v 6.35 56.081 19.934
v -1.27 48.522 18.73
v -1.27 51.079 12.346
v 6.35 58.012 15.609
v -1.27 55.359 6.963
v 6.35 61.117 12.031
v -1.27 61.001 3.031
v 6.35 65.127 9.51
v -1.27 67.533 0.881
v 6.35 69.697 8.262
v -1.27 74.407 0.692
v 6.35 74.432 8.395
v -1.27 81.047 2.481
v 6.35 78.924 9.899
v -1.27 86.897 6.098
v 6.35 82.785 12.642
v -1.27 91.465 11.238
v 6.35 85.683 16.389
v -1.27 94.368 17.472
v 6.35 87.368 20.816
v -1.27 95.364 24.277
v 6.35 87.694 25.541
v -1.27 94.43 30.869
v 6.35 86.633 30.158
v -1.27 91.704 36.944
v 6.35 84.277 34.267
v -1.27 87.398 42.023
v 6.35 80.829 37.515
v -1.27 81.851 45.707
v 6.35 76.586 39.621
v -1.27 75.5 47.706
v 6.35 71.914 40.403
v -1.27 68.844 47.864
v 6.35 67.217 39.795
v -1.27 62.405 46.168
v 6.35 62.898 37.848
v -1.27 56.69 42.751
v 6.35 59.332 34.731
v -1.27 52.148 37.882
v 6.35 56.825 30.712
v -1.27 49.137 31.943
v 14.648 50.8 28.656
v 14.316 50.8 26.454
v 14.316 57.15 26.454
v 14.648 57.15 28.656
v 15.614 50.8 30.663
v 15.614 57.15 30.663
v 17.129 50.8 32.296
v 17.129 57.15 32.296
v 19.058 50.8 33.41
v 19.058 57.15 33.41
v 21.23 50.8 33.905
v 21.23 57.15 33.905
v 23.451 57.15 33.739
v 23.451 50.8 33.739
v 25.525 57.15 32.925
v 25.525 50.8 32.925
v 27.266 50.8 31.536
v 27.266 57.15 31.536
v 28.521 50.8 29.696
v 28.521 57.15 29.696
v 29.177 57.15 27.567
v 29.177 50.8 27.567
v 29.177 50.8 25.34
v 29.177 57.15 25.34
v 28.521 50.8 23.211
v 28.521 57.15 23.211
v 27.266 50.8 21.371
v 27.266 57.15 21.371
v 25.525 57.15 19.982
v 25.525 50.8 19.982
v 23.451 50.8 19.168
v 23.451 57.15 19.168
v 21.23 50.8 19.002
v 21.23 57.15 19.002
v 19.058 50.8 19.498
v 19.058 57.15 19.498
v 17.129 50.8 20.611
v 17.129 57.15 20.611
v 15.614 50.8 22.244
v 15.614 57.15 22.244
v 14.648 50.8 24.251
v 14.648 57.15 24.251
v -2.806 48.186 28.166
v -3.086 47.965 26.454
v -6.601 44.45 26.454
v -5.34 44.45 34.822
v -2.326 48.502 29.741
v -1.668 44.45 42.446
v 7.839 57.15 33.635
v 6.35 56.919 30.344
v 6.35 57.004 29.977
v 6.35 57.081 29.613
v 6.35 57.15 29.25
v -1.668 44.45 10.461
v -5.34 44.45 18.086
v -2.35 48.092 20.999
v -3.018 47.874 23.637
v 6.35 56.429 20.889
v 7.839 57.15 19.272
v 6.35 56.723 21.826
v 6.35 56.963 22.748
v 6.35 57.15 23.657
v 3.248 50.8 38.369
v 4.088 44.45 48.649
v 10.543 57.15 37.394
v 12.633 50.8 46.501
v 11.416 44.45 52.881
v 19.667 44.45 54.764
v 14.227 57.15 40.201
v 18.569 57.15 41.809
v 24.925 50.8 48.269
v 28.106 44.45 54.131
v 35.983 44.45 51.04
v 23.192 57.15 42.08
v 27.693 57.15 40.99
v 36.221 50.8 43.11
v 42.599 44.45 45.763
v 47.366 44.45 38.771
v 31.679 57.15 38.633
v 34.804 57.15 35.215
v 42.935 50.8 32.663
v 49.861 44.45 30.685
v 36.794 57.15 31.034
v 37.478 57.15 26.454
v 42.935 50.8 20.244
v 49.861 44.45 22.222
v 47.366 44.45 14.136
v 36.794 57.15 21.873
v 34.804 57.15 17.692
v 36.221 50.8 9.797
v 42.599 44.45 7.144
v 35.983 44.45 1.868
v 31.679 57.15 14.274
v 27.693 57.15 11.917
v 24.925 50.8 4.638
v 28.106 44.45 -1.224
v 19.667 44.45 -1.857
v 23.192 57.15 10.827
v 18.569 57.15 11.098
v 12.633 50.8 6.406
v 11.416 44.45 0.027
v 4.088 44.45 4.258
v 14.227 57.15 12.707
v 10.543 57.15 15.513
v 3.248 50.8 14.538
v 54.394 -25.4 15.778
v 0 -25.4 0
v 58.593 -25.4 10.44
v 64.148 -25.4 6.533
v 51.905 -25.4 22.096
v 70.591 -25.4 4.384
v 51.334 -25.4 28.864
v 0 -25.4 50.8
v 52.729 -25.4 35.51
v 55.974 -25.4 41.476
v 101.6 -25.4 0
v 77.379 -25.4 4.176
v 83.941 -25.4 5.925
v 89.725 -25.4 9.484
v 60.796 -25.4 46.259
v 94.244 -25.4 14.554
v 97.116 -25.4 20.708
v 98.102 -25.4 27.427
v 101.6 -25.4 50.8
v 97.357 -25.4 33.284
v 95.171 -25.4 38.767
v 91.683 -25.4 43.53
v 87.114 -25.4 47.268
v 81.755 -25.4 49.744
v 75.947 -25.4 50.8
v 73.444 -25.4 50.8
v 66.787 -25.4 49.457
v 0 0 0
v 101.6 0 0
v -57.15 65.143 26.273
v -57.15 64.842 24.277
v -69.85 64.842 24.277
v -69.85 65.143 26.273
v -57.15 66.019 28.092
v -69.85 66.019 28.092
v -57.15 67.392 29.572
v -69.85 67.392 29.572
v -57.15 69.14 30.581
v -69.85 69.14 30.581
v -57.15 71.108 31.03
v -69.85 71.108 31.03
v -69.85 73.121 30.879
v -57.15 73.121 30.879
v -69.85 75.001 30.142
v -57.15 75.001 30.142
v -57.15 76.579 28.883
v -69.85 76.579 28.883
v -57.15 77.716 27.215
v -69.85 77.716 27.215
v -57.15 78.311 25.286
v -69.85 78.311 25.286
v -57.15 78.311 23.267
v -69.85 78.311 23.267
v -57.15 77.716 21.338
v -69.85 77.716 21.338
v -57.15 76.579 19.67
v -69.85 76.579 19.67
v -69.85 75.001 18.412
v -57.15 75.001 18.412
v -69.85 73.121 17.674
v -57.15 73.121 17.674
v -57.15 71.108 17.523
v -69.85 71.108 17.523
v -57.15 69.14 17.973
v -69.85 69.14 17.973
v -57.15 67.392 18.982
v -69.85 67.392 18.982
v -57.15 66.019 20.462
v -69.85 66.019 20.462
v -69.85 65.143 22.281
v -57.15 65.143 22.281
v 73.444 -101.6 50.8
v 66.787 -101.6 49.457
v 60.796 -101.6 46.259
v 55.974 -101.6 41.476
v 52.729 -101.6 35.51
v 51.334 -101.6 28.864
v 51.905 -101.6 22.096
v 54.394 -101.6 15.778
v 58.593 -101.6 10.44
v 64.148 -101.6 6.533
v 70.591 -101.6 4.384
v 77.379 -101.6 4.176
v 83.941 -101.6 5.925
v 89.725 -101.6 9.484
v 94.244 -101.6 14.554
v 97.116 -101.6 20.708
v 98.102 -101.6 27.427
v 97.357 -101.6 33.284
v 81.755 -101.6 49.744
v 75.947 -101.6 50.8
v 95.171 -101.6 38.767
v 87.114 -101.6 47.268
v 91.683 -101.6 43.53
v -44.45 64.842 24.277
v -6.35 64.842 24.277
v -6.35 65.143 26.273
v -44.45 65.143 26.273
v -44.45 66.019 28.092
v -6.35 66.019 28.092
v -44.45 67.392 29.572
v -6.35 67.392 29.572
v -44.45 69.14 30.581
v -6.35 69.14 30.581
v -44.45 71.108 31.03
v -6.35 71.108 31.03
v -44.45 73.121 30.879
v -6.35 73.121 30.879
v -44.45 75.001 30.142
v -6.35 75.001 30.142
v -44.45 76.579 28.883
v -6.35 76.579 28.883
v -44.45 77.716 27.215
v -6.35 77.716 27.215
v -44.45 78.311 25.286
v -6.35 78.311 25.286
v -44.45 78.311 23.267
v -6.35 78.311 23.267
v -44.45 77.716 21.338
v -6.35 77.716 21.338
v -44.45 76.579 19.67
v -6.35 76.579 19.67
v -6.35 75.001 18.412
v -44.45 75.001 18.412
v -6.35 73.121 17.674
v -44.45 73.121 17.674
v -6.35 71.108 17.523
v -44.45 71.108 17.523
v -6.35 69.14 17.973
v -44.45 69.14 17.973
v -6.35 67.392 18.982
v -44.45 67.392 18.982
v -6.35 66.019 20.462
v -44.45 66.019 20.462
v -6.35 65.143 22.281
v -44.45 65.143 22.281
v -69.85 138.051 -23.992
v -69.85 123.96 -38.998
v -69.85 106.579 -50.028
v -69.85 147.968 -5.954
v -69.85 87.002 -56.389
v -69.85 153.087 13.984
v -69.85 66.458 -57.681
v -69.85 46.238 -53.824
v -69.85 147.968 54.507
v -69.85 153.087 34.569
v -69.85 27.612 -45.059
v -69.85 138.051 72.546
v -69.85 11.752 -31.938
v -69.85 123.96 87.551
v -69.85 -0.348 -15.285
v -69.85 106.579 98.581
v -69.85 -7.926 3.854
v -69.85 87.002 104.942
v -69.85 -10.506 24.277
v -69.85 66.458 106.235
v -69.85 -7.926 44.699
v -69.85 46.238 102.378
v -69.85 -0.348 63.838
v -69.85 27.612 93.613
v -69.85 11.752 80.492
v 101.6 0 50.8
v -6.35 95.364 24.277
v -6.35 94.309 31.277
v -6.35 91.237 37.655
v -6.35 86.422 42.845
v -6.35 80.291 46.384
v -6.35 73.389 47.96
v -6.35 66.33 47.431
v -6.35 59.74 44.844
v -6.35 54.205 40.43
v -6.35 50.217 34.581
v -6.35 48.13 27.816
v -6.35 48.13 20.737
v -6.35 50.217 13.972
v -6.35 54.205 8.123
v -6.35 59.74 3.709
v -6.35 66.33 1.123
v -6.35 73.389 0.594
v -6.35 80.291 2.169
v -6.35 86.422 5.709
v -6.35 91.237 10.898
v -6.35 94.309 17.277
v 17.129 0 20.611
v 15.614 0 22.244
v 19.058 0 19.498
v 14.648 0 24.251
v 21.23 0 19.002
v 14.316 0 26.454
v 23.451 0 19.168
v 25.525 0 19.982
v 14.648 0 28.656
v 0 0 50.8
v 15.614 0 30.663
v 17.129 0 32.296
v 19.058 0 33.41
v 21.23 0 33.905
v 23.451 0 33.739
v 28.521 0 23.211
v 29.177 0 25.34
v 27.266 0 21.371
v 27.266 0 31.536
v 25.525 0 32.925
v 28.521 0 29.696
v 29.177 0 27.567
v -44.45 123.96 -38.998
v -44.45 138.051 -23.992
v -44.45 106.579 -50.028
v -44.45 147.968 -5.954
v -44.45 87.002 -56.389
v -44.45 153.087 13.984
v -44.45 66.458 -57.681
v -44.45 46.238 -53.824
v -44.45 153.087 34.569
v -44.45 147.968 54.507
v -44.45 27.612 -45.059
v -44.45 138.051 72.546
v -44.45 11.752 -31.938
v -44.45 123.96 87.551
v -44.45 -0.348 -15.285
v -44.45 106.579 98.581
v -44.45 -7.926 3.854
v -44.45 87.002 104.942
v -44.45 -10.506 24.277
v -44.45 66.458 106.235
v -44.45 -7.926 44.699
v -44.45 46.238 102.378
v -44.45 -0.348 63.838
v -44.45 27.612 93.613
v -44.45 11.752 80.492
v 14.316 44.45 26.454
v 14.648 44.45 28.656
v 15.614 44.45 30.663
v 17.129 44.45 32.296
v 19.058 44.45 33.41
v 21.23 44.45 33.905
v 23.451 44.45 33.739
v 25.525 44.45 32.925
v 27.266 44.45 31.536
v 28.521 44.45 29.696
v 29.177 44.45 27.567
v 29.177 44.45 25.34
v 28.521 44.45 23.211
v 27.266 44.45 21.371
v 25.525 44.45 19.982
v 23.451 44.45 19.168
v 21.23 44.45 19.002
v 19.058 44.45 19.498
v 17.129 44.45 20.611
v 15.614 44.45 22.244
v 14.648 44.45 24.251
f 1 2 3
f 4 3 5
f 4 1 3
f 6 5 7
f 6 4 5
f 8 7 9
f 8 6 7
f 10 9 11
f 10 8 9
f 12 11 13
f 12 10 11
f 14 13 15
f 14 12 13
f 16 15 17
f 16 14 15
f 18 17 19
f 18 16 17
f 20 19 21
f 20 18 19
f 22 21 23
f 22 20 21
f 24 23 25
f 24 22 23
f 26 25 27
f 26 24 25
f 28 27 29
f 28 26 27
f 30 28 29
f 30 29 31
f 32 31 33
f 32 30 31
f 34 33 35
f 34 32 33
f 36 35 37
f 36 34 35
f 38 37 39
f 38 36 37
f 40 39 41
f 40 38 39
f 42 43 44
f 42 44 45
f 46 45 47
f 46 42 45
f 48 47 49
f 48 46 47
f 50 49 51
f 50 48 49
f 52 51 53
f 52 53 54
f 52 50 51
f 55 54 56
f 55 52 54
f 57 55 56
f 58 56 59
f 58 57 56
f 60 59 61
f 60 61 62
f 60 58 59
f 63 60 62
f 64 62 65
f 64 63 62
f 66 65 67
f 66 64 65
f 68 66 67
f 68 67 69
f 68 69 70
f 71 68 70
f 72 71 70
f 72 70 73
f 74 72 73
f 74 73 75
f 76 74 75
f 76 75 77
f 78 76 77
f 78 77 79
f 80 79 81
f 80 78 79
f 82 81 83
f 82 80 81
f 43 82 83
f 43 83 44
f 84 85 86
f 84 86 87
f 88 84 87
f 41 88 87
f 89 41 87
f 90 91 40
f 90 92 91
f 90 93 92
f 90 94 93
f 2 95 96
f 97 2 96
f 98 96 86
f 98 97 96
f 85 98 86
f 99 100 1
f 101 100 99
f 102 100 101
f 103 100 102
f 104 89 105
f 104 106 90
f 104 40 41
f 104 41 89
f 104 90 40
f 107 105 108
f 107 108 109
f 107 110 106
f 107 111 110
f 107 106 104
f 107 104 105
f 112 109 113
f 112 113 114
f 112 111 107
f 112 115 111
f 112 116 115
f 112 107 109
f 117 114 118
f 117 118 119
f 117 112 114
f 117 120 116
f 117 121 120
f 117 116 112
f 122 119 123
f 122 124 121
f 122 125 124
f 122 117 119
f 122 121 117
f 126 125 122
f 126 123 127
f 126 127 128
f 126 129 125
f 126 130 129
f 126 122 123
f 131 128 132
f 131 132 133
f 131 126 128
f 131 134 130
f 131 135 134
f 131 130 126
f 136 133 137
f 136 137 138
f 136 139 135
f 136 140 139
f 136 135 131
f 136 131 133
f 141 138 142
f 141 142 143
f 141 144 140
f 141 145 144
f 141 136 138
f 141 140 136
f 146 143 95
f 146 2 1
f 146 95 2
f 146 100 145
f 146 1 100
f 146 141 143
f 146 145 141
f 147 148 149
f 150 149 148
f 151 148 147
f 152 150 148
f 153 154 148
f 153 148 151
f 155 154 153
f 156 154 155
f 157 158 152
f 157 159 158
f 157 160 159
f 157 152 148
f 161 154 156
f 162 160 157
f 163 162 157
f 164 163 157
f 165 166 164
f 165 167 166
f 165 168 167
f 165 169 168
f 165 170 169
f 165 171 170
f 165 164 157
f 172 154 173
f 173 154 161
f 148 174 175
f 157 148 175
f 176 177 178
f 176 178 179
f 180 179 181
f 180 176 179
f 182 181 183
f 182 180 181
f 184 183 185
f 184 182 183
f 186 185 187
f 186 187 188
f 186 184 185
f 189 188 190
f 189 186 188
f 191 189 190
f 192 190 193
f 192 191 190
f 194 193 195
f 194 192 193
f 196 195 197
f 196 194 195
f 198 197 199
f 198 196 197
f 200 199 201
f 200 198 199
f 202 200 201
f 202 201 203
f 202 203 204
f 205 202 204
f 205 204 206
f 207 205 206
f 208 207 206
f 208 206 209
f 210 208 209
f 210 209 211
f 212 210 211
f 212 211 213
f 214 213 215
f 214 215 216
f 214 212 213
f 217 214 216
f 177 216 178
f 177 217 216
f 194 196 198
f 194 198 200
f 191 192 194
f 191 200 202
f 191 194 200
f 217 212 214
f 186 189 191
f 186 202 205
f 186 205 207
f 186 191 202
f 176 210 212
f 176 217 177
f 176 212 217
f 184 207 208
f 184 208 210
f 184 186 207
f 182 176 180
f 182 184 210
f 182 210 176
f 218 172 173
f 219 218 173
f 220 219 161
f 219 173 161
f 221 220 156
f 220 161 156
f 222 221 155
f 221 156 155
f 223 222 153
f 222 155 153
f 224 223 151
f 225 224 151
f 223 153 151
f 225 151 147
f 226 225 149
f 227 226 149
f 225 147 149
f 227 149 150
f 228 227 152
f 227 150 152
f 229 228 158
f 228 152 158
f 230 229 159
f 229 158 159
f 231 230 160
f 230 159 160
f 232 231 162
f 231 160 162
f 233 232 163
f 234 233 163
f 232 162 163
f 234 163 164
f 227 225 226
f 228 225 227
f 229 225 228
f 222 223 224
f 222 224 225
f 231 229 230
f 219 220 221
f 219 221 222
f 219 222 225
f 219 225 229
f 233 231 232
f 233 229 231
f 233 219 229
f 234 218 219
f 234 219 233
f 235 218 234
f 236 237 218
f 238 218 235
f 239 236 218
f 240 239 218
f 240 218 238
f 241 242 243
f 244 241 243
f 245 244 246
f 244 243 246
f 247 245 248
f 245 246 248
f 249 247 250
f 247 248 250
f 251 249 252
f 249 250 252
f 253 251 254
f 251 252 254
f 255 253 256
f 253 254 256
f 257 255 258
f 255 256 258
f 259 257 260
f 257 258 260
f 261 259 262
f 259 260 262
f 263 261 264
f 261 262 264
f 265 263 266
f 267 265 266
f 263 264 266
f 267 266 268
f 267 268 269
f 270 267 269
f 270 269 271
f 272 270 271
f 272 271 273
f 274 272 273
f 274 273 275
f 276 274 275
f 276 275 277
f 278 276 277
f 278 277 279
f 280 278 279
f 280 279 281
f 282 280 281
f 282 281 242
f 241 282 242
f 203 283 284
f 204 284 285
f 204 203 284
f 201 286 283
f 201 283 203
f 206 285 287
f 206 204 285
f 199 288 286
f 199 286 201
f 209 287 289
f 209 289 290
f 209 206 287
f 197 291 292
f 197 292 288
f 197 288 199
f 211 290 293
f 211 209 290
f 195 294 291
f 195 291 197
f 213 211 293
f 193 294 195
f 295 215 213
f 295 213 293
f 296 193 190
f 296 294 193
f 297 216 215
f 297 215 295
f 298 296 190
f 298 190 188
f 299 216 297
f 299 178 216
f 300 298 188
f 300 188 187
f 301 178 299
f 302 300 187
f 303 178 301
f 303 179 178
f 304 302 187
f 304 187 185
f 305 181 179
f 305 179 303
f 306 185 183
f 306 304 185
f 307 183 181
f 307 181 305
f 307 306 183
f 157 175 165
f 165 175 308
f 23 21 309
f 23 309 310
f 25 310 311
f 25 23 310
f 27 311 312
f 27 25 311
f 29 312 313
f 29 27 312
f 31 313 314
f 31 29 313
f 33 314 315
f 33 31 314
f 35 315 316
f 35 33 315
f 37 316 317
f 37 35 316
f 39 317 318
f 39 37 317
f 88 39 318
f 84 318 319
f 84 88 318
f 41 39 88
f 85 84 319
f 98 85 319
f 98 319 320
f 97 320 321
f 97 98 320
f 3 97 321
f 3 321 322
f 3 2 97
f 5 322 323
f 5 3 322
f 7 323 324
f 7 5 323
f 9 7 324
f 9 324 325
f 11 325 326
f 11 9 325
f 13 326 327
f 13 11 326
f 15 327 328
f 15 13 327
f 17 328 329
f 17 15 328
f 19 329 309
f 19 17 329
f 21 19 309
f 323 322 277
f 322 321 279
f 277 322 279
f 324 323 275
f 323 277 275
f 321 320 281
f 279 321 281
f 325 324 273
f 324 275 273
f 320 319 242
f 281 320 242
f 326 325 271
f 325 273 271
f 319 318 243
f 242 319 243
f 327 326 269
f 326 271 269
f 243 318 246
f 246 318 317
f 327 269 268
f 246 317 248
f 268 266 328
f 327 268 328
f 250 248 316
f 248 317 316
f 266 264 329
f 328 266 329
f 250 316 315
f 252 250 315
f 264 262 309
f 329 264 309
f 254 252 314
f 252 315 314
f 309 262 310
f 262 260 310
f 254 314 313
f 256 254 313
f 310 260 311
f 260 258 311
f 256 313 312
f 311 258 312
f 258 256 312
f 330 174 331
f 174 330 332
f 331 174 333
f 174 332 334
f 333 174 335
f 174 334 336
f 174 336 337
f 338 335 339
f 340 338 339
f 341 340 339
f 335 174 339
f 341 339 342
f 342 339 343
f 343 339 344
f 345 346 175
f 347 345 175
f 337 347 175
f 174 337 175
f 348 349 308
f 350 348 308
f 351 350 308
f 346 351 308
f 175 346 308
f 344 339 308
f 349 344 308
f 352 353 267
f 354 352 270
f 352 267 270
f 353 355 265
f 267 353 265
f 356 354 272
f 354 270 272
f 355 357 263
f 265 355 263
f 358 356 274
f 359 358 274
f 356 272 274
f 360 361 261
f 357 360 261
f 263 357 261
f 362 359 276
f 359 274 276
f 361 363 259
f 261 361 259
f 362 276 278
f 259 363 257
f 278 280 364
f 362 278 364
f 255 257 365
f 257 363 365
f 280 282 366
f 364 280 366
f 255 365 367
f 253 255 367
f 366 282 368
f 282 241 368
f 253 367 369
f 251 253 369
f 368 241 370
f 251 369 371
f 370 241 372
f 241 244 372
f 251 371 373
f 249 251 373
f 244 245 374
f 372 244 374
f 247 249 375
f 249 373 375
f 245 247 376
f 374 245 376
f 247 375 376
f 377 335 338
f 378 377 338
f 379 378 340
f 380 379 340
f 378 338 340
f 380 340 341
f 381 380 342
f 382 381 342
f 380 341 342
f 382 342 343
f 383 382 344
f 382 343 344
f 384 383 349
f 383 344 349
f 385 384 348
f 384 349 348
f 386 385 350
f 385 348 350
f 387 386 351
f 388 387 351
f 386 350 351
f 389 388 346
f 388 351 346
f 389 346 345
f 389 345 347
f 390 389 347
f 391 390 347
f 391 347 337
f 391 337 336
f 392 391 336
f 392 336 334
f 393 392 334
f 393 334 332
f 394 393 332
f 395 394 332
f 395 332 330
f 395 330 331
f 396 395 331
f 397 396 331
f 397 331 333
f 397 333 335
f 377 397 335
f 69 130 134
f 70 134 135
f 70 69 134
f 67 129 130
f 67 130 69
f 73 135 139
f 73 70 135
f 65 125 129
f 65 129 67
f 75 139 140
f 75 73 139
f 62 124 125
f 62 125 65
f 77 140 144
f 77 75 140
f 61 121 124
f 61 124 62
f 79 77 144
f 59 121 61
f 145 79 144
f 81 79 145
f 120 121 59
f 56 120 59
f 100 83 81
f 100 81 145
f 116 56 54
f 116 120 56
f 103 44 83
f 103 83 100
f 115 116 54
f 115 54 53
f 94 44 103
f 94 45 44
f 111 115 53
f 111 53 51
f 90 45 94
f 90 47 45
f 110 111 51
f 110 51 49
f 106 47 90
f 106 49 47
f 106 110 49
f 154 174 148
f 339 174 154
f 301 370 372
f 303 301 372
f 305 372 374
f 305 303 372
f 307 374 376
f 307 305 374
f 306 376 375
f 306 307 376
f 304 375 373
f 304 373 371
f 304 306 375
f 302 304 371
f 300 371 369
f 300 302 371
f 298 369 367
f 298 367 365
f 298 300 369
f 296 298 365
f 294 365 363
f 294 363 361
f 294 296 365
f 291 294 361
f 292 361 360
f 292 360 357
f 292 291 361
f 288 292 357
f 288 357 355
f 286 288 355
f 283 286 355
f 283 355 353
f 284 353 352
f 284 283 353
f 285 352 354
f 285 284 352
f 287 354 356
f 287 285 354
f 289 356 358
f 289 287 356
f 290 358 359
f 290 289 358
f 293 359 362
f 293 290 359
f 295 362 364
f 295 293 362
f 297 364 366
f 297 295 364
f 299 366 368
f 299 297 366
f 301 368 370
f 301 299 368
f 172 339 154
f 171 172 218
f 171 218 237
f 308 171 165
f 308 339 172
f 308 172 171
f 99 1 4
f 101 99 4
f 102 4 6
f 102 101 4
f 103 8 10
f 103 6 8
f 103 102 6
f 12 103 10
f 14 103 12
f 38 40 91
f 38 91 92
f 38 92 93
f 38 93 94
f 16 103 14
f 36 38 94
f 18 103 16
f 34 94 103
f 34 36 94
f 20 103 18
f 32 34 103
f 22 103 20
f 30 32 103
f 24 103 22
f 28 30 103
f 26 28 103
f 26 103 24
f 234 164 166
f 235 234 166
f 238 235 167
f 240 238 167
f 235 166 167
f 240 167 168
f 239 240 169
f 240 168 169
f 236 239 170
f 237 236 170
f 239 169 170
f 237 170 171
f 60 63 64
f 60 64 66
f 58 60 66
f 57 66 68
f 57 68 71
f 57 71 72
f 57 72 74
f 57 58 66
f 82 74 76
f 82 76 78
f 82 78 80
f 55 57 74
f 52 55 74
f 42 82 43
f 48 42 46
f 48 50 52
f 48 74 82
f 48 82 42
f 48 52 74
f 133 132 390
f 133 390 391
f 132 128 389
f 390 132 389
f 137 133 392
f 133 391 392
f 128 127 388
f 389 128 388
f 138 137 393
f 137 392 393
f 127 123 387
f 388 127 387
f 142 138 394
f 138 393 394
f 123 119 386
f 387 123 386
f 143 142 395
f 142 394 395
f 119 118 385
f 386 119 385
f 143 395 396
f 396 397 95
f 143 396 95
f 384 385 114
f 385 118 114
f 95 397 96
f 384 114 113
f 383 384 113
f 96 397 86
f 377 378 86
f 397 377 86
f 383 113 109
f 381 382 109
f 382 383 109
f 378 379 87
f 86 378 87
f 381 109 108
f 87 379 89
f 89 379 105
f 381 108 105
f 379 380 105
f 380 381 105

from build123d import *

# Parameters (mm, degrees)
F0_W      = 101.6
F0_H      = 50.8
F1_DEPTH  = 25.4
F3_DEPTH  = 76.2
F4_R      = 7.4724872864
F5_DEPTH  = 50.8
F6_R      = 28.3895179235
F6_R_2    = 7.4724872864
F7_DEPTH  = 6.35
F8_SIZE   = 12.69999
F9_R      = 23.7493356576
F10_DEPTH = 6.35
F11_SIZE  = 7.62
F12_R     = 6.7723102527
F13_DEPTH = 50.8
F14_R     = 82.1200007596
F14_R_2   = 6.7723102527
F15_DEPTH = 12.7


# Not quite as in the source:
# - a fillet or chamfer is up to 0.001 mm smaller than in the source, because OpenCascade refuses the exact size


with BuildPart() as f1:
    # F0 (on Front) → F1 (new body)
    with BuildSketch(Plane.XZ):
        with Locations((50.8, 25.4)):
            Rectangle(F0_W, F0_H)
    extrude(amount=F1_DEPTH)

    # F2 (on face) → F3 (join)
    with BuildSketch(Plane.XZ.offset(25.4)):
        with BuildLine():
            ThreePointArc((73.4443714217, 50.8), (58.5934004133, 10.4401432835), (98.1016742507, 27.4273641407))
            ThreePointArc((98.1016742507, 27.4273641407), (91.6827931143, 43.5295359845), (75.9467730924, 50.8))
            Line((75.9467730924, 50.8), (73.4443714217, 50.8))
        make_face()
    extrude(amount=F3_DEPTH)

    # F4 (on face) → F5 (join)
    with BuildSketch(Plane(origin=(0, 0, 0), x_dir=(-1, 0, 0), z_dir=(0, 1, 0))):
        with Locations((-21.7883531004, 26.4536123723)):
            Circle(F4_R)
    extrude(amount=F5_DEPTH)

    # F6 (on face) → F7 (join, symmetric)
    with BuildSketch(Plane(origin=(0, 50.8, 0), x_dir=(-1, 0, 0), z_dir=(0, 1, 0))):
        with Locations((-21.7883531004, 26.4536123723)):
            Circle(F6_R)
        with Locations((-21.7883531004, 26.4536123723)):
            Circle(F6_R_2, mode=Mode.SUBTRACT)
    extrude(amount=F7_DEPTH, both=True)

    # F8 (size 12.7 in the source; OpenCascade refuses exactly that, so slightly less here)
    f8_edges = [f1.edges().sort_by_distance(p)[0] for p in [
        (50.177871, 57.15, 26.453612),
    ]]
    chamfer(f8_edges, length=F8_SIZE)

    # F9 (on Right) → F10 (join, symmetric)
    with BuildSketch(Plane.YZ):
        with Locations((71.6144831948, 24.2767716783)):
            Circle(F9_R)
    extrude(amount=F10_DEPTH, both=True)

    # F11
    f11_edges = [f1.edges().sort_by_distance(p)[0] for p in [
        (6.35, 79.39333, 46.716034),
        (6.35, 78.162989, 1.448105),
    ]]
    chamfer(f11_edges, length=F11_SIZE)

    # F12 (on face) → F13 (join)
    with BuildSketch(Plane(origin=(-6.35, 0, 0), x_dir=(0, -1, 0), z_dir=(-1, 0, 0))):
        with Locations((-71.6144831948, 24.2767716783)):
            Circle(F12_R)
    extrude(amount=F13_DEPTH)

    # F14 (on face) → F15 (join, symmetric)
    with BuildSketch(Plane(origin=(-57.15, 0, 0), x_dir=(0, -1, 0), z_dir=(-1, 0, 0))):
        with Locations((-71.6144831948, 24.2767716783)):
            Circle(F14_R)
        with Locations((-71.6144831948, 24.2767716783)):
            Circle(F14_R_2, mode=Mode.SUBTRACT)
    extrude(amount=F15_DEPTH, both=True)


solid = f1.part
